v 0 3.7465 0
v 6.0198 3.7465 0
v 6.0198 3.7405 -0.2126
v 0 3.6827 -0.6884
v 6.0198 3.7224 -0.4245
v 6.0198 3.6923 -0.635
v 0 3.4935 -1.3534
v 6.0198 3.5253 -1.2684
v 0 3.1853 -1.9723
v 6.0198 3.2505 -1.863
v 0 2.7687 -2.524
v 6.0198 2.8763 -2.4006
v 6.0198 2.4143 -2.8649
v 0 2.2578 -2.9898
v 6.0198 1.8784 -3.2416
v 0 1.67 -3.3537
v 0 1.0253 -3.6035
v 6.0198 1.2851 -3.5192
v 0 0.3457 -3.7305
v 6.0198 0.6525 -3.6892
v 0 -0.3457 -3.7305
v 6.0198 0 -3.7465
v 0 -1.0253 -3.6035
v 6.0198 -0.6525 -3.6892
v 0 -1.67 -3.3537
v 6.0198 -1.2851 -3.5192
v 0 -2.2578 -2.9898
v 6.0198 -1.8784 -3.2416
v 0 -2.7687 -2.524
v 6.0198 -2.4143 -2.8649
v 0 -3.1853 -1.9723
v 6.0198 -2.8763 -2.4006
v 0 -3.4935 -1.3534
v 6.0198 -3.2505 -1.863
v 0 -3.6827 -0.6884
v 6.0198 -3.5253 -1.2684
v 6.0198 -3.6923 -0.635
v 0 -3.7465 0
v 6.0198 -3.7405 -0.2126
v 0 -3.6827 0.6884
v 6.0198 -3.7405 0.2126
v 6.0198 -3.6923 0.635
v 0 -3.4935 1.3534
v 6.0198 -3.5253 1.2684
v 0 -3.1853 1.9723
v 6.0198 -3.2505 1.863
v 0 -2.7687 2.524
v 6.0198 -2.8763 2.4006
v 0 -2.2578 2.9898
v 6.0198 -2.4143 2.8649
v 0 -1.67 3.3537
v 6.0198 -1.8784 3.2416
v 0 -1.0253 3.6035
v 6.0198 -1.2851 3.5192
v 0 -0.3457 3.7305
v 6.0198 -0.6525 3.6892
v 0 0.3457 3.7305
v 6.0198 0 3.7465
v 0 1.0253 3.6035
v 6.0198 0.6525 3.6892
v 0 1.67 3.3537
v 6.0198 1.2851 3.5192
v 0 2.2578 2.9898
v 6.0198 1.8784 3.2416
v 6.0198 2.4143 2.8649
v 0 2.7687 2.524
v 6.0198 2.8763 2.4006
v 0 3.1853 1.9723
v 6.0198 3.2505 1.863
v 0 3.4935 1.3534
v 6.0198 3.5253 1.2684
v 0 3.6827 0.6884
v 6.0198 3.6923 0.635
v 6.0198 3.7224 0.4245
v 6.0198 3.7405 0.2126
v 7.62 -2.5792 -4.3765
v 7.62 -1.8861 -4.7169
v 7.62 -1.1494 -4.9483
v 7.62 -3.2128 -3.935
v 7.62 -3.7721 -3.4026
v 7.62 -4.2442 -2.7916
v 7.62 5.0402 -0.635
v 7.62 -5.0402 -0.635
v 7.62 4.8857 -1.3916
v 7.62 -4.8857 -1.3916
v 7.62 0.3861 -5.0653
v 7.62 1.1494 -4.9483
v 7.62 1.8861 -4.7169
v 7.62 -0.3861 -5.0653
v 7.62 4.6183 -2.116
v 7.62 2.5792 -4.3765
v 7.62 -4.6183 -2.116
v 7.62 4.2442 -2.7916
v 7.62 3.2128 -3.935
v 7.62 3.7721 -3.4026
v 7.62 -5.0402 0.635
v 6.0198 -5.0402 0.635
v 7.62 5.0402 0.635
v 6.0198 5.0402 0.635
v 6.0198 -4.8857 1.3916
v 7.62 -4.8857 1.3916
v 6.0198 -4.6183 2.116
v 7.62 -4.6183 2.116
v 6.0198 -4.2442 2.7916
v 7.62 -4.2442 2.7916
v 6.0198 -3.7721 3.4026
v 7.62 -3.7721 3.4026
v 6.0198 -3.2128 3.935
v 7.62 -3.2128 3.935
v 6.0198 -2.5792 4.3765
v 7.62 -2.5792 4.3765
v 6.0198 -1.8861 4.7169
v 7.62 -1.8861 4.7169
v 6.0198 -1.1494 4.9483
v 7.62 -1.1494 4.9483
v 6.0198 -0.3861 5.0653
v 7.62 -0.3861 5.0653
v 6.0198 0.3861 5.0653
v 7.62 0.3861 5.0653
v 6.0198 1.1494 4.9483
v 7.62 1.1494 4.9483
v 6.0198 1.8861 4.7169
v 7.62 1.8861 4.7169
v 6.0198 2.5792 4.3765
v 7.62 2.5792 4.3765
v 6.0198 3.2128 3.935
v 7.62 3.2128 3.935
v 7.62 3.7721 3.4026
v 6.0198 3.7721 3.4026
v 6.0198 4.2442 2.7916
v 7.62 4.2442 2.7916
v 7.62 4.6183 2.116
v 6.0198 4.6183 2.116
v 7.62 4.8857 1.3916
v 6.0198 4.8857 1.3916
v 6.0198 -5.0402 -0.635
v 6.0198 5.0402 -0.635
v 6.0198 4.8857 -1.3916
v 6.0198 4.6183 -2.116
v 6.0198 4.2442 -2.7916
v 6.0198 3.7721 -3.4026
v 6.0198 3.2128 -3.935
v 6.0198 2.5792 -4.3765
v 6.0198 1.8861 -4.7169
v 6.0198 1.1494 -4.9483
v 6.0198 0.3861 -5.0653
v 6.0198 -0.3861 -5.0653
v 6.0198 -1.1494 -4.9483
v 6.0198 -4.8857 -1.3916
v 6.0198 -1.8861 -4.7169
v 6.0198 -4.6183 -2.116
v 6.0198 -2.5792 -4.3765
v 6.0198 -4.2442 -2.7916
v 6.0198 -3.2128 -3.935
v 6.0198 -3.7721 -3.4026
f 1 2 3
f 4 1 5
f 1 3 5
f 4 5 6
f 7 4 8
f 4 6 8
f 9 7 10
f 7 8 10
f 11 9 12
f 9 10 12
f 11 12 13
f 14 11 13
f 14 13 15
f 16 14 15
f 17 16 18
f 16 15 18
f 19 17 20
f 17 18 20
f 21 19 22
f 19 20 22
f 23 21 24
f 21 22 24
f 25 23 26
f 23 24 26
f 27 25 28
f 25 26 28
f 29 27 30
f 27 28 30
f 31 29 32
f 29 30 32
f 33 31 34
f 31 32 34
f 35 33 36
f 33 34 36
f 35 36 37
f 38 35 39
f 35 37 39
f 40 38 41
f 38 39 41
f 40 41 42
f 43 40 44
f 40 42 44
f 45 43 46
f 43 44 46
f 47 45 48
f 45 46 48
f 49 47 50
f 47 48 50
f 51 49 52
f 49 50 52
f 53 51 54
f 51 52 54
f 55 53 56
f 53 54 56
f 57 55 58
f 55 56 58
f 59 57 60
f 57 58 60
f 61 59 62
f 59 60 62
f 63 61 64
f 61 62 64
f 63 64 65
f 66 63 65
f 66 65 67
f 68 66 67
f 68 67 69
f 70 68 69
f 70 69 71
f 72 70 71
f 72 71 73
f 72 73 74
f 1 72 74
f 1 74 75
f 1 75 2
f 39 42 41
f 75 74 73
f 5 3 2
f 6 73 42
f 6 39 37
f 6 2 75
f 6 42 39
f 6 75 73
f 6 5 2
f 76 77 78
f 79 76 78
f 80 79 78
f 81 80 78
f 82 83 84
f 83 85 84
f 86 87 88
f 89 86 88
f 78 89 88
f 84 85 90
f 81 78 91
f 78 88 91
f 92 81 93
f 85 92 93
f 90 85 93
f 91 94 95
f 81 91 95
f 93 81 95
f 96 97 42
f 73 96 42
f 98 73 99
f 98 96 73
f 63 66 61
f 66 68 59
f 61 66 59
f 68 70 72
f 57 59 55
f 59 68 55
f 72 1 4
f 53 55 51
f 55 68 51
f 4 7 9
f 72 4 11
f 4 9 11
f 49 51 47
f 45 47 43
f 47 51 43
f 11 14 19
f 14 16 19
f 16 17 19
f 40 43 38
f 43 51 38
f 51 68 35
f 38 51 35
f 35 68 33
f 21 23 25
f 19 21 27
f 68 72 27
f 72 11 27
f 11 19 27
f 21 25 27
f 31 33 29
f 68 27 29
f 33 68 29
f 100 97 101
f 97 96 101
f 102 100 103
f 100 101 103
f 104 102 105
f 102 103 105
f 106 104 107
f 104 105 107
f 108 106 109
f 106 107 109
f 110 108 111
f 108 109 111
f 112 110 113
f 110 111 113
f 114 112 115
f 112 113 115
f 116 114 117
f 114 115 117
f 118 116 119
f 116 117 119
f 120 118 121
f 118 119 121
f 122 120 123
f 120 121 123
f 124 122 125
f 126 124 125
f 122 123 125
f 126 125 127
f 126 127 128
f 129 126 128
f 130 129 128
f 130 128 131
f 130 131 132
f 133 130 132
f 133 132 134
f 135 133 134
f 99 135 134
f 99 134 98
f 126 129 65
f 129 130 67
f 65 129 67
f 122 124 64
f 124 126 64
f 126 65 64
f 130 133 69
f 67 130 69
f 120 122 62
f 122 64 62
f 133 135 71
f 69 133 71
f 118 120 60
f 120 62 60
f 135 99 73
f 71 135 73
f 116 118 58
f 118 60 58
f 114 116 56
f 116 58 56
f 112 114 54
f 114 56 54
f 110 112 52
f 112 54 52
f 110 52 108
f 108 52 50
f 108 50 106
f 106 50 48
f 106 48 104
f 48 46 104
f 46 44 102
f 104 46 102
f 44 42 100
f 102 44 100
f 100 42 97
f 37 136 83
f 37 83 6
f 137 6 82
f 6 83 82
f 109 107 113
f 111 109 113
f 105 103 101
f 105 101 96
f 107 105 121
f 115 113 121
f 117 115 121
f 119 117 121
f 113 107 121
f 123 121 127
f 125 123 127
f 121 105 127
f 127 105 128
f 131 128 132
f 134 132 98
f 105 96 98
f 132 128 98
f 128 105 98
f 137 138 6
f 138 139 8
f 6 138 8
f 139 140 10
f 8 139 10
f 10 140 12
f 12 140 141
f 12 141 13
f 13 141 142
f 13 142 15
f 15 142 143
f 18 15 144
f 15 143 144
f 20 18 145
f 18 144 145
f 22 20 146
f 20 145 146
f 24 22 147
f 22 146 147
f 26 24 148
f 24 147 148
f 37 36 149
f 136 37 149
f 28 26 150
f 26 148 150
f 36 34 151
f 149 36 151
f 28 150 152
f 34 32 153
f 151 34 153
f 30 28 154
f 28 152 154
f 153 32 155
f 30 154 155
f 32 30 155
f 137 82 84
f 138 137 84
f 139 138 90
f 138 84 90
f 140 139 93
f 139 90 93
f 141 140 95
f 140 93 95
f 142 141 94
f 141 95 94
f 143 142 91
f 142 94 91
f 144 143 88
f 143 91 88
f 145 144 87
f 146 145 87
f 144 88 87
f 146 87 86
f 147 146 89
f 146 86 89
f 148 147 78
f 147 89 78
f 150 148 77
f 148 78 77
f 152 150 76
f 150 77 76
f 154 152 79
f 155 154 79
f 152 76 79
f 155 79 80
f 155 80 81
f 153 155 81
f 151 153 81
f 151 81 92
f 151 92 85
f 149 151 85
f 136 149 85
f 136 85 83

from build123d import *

# Parameters (mm, degrees)
SKETCH3_W          = 1.27
SKETCH3_H          = 10.683807707
CUT_EXTRUDE1_DEPTH = 1.6002


with BuildPart() as part:
    # Sketch1 → Revolve1 (revolve)
    with BuildSketch(Plane.XY):
        Polygon((0, 0), (0, 3.7465), (6.0198, 3.7465), (6.0198, 5.08), (7.62, 5.08), (7.62, 0), align=None)
    revolve(axis=Axis((7.62, 0, 0), (-1, 0, 0)))

    # Sketch3 → Cut-Extrude1 (cut)
    with BuildSketch(Plane(origin=(7.62, 0, 0), x_dir=(0, 0, -1), z_dir=(1, 0, 0))):
        with Locations((0, -0.049309881)):
            Rectangle(SKETCH3_W, SKETCH3_H)
    extrude(amount=-CUT_EXTRUDE1_DEPTH, mode=Mode.SUBTRACT)


solid = part.part
